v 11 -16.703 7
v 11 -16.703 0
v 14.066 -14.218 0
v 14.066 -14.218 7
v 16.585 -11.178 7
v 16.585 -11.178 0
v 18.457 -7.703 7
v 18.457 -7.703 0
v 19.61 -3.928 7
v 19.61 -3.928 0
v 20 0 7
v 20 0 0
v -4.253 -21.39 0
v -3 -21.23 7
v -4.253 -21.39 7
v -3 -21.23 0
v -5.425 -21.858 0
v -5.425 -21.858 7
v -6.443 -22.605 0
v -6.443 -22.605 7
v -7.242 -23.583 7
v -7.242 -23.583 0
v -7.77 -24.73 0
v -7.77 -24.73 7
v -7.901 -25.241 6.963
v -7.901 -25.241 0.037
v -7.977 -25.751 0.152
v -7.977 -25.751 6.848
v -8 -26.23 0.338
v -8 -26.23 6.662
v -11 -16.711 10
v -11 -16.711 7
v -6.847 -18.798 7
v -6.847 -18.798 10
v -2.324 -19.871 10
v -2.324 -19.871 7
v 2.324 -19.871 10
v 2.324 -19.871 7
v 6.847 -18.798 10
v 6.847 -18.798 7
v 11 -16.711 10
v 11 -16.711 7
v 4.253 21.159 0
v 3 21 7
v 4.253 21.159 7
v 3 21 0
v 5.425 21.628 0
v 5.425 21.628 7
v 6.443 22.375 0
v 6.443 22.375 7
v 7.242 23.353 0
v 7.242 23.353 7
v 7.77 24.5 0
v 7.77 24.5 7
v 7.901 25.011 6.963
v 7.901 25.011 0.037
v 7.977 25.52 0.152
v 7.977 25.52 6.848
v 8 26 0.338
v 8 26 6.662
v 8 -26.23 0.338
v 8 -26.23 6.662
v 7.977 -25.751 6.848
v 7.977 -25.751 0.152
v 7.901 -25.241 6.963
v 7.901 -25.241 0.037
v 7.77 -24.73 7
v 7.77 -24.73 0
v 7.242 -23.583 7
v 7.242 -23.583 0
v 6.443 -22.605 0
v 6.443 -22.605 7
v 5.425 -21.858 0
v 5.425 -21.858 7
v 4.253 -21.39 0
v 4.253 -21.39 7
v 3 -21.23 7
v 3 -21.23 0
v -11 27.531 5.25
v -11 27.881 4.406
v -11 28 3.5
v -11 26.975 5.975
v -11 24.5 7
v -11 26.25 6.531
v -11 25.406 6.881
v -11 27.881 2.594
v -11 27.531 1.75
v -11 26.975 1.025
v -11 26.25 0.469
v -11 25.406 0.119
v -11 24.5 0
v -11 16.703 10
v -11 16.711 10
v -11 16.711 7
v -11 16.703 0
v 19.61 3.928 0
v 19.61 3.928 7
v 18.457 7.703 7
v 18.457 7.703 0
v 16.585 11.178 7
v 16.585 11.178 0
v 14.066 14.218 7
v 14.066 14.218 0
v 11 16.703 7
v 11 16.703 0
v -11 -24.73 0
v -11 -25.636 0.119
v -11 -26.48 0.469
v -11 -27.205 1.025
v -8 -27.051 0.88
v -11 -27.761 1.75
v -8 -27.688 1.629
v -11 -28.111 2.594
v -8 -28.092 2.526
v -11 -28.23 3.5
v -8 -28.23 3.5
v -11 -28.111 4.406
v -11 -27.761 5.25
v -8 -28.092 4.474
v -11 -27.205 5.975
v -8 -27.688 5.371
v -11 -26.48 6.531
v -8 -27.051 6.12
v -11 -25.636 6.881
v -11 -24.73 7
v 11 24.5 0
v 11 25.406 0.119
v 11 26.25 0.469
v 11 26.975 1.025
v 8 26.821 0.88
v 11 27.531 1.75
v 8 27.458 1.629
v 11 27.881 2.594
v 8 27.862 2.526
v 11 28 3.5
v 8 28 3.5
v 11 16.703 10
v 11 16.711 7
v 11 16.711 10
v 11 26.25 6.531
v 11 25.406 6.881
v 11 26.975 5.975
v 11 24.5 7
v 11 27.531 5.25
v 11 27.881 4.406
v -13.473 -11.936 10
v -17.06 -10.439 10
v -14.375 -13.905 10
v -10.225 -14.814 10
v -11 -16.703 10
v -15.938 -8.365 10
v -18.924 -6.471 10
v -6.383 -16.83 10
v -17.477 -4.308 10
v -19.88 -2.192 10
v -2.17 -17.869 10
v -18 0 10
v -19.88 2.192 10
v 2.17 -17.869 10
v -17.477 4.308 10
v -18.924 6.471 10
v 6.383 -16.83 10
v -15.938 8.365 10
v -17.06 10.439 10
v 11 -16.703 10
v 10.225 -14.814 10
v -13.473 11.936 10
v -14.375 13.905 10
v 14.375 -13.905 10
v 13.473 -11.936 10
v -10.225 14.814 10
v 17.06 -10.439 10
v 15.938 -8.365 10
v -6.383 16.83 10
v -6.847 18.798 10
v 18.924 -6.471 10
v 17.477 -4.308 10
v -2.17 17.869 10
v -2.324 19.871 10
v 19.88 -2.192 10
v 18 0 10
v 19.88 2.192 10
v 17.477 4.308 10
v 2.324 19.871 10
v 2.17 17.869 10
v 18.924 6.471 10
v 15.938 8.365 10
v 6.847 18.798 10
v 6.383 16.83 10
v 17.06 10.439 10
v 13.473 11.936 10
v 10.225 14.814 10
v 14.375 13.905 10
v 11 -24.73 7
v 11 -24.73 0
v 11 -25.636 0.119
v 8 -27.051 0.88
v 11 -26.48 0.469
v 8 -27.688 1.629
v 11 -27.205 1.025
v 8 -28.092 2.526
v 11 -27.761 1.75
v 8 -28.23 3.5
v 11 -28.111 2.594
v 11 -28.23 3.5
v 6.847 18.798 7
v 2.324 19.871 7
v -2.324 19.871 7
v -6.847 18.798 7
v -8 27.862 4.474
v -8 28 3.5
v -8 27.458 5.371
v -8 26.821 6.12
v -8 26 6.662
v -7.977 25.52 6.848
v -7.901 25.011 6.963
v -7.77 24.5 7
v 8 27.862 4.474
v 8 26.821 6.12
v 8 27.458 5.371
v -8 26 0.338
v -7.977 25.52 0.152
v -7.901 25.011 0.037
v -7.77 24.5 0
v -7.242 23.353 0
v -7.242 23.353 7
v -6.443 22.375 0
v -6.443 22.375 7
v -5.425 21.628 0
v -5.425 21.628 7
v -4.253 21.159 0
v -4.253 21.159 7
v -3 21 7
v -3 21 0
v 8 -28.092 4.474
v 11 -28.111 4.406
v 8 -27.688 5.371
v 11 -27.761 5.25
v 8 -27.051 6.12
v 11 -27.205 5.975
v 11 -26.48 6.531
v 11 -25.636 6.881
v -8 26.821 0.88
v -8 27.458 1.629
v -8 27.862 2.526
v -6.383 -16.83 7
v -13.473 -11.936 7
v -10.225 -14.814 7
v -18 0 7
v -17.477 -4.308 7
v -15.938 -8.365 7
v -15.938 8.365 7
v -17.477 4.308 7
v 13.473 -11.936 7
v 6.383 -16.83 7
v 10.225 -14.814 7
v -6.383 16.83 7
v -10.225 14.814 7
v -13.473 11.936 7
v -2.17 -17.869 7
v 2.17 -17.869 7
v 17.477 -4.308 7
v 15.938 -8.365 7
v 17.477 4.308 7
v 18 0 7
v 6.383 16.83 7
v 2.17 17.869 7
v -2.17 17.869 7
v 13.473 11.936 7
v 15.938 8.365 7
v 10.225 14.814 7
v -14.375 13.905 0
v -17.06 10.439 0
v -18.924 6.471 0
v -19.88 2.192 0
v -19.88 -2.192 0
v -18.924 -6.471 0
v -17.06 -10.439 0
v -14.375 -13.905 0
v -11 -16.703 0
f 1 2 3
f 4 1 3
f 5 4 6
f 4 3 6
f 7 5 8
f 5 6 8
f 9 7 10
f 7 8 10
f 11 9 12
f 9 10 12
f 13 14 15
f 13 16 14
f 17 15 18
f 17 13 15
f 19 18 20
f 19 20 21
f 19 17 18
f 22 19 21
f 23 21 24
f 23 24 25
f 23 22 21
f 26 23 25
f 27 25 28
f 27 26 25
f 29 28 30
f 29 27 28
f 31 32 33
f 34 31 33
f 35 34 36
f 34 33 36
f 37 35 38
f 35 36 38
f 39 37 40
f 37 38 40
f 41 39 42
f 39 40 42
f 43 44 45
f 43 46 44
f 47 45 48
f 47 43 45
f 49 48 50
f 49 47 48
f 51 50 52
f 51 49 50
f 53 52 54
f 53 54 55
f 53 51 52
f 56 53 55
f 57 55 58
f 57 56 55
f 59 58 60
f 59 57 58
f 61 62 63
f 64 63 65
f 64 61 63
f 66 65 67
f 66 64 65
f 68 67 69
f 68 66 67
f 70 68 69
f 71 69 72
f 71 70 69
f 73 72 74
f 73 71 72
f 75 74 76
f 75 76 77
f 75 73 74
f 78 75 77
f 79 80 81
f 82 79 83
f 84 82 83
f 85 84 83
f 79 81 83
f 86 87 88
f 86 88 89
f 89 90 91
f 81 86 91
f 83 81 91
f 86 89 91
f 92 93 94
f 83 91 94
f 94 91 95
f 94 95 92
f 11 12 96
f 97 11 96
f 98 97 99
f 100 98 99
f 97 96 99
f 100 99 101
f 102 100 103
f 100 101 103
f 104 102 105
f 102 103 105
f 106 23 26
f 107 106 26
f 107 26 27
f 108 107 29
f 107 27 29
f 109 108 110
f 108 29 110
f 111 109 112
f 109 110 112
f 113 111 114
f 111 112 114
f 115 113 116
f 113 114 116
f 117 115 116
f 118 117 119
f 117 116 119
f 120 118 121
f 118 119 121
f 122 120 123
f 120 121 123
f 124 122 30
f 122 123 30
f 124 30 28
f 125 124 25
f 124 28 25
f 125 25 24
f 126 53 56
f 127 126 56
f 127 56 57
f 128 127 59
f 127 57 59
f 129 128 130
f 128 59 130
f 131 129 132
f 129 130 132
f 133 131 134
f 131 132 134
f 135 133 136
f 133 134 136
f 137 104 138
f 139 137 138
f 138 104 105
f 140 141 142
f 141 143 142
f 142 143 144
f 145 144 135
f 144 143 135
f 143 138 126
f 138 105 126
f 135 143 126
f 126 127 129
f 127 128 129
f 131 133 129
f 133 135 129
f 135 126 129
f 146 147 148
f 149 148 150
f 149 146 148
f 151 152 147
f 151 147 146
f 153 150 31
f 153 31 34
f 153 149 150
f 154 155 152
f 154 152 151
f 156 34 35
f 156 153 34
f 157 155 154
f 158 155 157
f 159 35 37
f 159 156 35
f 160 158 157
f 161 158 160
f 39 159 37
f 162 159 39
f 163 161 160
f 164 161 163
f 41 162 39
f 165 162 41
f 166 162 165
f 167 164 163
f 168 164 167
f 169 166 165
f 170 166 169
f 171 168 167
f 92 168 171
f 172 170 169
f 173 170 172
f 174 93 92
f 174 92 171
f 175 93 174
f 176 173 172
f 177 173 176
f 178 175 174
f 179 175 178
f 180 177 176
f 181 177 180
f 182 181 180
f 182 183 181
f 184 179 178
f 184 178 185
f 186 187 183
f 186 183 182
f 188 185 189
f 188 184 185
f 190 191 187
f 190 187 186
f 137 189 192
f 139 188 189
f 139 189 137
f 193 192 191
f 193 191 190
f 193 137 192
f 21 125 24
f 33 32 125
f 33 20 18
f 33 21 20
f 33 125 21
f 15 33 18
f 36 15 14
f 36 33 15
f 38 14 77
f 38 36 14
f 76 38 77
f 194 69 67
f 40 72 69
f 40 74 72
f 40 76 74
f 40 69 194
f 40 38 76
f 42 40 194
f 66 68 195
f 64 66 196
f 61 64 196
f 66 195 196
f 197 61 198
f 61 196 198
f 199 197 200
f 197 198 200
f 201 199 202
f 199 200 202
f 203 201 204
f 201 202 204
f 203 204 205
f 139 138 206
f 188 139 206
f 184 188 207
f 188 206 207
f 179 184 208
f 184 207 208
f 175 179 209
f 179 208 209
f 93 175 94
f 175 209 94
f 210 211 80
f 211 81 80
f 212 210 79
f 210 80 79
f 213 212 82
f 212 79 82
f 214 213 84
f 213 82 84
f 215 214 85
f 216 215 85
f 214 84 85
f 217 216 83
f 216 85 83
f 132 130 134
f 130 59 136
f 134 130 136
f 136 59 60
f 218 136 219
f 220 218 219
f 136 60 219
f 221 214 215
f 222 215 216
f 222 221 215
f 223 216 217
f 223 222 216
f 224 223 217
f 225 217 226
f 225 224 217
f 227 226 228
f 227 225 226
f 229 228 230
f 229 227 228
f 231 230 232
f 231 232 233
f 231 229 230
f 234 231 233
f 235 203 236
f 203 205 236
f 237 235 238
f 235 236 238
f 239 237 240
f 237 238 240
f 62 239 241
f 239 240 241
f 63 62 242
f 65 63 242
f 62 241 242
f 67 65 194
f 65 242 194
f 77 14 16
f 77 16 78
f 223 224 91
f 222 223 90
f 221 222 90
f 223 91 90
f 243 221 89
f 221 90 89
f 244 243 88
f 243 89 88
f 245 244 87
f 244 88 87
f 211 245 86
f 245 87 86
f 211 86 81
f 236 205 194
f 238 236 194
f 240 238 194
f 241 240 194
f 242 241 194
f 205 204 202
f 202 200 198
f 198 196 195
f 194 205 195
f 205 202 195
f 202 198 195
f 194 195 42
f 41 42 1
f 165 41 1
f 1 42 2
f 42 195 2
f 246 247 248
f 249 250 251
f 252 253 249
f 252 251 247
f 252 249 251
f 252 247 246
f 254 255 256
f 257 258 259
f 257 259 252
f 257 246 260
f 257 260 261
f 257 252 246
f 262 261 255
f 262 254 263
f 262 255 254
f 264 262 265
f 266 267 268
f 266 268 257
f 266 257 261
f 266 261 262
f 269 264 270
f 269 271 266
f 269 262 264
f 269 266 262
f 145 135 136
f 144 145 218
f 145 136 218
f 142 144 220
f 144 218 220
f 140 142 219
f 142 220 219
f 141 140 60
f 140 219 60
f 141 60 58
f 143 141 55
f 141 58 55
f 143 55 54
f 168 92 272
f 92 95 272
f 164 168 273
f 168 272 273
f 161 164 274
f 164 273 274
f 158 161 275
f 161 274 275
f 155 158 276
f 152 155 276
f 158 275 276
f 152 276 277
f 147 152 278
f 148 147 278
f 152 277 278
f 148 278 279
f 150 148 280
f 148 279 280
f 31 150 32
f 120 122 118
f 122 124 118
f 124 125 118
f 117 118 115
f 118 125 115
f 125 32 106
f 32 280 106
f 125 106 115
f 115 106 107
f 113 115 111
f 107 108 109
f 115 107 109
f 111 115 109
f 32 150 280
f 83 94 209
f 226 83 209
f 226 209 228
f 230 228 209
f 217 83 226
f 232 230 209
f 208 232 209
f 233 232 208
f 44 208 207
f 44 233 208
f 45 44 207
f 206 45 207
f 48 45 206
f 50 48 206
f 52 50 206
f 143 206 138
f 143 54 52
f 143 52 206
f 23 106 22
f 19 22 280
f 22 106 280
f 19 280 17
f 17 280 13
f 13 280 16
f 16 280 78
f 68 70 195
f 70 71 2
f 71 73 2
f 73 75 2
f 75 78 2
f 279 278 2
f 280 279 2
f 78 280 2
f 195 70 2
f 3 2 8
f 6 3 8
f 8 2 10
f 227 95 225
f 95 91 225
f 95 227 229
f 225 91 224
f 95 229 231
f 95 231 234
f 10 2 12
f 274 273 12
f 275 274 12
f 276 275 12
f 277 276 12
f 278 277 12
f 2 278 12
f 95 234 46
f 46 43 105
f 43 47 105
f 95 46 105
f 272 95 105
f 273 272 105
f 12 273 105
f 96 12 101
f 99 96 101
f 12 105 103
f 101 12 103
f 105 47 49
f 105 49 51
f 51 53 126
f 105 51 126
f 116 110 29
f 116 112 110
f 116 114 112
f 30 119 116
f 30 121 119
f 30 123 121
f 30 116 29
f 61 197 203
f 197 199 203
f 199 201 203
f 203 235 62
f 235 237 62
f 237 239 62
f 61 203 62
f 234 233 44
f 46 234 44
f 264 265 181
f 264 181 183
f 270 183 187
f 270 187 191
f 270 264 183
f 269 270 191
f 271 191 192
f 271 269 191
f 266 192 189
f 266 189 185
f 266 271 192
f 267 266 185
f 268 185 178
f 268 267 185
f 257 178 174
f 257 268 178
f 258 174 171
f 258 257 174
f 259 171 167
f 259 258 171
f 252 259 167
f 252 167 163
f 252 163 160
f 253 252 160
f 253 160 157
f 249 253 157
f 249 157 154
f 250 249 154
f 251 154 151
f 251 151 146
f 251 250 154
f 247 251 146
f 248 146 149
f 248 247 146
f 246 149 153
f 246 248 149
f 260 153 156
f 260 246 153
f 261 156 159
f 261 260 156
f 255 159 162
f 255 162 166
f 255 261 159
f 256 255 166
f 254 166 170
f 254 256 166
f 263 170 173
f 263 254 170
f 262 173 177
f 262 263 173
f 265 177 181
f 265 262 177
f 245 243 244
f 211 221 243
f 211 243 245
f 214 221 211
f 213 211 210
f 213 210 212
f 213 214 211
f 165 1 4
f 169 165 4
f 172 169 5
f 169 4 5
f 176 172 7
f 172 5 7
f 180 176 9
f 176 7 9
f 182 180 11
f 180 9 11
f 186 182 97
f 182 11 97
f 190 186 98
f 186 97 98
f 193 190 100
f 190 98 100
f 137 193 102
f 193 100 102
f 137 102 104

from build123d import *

# Parameters (mm, degrees)
F1_DEPTH = 7
F2_W     = 16
F2_H     = 7
F3_DEPTH = 10
F4_R     = 5
F5_R     = 3.49999
F6_R     = 18
F7_DEPTH = 3


# Not quite as in the source:
# - a fillet or chamfer is up to 0.001 mm smaller than in the source, because OpenCascade refuses the exact size


with BuildPart() as f1:
    # F0 (on Top) → F1 (new body)
    with BuildSketch(Plane.XY):
        with BuildLine():
            ThreePointArc((11, -16.7032930885), (17.6068168617, -9.4868329805), (20, 0))
            ThreePointArc((20, 0), (17.6068168617, 9.4868329805), (11, 16.7032930885))
            Line((11, 16.7032930885), (11, 12))
            Line((11, 12), (-11, 12))
            Line((-11, 12), (-11, 16.7032930885))
            ThreePointArc((-11, 16.7032930885), (-20, 0), (-11, -16.7032930885))
            Line((-11, -16.7032930885), (-11, -11.7698283494))
            Line((-11, -11.7698283494), (11, -11.7698283494))
            Line((11, -11.7698283494), (11, -16.7032930885))
        make_face()
        with BuildLine():
            Line((11, 12), (11, 16.7032930885))
            ThreePointArc((11, 16.7032930885), (0, 20), (-11, 16.7032930885))
            Line((-11, 16.7032930885), (-11, 12))
            Line((-11, 12), (11, 12))
        make_face()
        with BuildLine():
            ThreePointArc((-11, 16.7032930885), (0, 20), (11, 16.7032930885))
            Line((11, 16.7032930885), (11, 28))
            Line((11, 28), (-11, 28))
            Line((-11, 28), (-11, 16.7032930885))
        make_face()
        with BuildLine():
            Line((11, -28.2301716506), (11, -16.7032930885))
            ThreePointArc((11, -16.7032930885), (0, -20), (-11, -16.7032930885))
            Line((-11, -16.7032930885), (-11, -28.2301716506))
            Line((-11, -28.2301716506), (11, -28.2301716506))
        make_face()
        with BuildLine():
            ThreePointArc((-11, -16.7032930885), (0, -20), (11, -16.7032930885))
            Line((11, -16.7032930885), (11, -11.7698283494))
            Line((11, -11.7698283494), (-11, -11.7698283494))
            Line((-11, -11.7698283494), (-11, -16.7032930885))
        make_face()
    extrude(amount=F1_DEPTH)

    # F2 (on face) → F3 (cut)
    with BuildSketch(Plane.XY.offset(7)):
        with Locations((0, 24.5)):
            Rectangle(F2_W, F2_H)
        with Locations((0, -24.7301716506)):
            Rectangle(F2_W, F2_H)
    extrude(amount=-F3_DEPTH, mode=Mode.SUBTRACT)

    # F4
    f4_edges = [f1.edges().sort_by_distance(p)[0] for p in [
        (-8, 21, 3.5),
        (8, 21, 3.5),
        (8, -21.230172, 3.5),
        (-8, -21.230172, 3.5),
    ]]
    fillet(f4_edges, radius=F4_R)

    # F5 (radius 3.5 in the source; OpenCascade refuses exactly that, so slightly less here)
    f5_edges = [f1.edges().sort_by_distance(p)[0] for p in [
        (-9.5, -28.230172, 7),
        (9.5, -28.230172, 7),
        (-9.5, 28, 7),
        (9.5, 28, 7),
        (-9.5, 28, 0),
        (9.5, 28, 0),
        (-9.5, -28.230172, 0),
        (9.5, -28.230172, 0),
    ]]
    fillet(f5_edges, radius=F5_R)

    # F6 (on face) → F7 (join)
    with BuildSketch(Plane.XY.offset(7)):
        with BuildLine():
            Line((11, 16.7032930885), (11, 16.71100699))
            ThreePointArc((11, 16.71100699), (0, 20.0064428277), (-11, 16.71100699))
            Line((-11, 16.71100699), (-11, 16.7032930885))
            ThreePointArc((-11, 16.7032930885), (-20, 0), (-11, -16.7032930885))
            Line((-11, -16.7032930885), (-11, -16.71100699))
            ThreePointArc((-11, -16.71100699), (0, -20.0064428277), (11, -16.71100699))
            Line((11, -16.71100699), (11, -16.7032930885))
            ThreePointArc((11, -16.7032930885), (20, 0), (11, 16.7032930885))
        make_face()
        Circle(F6_R, mode=Mode.SUBTRACT)
    extrude(amount=F7_DEPTH)


solid = f1.part
